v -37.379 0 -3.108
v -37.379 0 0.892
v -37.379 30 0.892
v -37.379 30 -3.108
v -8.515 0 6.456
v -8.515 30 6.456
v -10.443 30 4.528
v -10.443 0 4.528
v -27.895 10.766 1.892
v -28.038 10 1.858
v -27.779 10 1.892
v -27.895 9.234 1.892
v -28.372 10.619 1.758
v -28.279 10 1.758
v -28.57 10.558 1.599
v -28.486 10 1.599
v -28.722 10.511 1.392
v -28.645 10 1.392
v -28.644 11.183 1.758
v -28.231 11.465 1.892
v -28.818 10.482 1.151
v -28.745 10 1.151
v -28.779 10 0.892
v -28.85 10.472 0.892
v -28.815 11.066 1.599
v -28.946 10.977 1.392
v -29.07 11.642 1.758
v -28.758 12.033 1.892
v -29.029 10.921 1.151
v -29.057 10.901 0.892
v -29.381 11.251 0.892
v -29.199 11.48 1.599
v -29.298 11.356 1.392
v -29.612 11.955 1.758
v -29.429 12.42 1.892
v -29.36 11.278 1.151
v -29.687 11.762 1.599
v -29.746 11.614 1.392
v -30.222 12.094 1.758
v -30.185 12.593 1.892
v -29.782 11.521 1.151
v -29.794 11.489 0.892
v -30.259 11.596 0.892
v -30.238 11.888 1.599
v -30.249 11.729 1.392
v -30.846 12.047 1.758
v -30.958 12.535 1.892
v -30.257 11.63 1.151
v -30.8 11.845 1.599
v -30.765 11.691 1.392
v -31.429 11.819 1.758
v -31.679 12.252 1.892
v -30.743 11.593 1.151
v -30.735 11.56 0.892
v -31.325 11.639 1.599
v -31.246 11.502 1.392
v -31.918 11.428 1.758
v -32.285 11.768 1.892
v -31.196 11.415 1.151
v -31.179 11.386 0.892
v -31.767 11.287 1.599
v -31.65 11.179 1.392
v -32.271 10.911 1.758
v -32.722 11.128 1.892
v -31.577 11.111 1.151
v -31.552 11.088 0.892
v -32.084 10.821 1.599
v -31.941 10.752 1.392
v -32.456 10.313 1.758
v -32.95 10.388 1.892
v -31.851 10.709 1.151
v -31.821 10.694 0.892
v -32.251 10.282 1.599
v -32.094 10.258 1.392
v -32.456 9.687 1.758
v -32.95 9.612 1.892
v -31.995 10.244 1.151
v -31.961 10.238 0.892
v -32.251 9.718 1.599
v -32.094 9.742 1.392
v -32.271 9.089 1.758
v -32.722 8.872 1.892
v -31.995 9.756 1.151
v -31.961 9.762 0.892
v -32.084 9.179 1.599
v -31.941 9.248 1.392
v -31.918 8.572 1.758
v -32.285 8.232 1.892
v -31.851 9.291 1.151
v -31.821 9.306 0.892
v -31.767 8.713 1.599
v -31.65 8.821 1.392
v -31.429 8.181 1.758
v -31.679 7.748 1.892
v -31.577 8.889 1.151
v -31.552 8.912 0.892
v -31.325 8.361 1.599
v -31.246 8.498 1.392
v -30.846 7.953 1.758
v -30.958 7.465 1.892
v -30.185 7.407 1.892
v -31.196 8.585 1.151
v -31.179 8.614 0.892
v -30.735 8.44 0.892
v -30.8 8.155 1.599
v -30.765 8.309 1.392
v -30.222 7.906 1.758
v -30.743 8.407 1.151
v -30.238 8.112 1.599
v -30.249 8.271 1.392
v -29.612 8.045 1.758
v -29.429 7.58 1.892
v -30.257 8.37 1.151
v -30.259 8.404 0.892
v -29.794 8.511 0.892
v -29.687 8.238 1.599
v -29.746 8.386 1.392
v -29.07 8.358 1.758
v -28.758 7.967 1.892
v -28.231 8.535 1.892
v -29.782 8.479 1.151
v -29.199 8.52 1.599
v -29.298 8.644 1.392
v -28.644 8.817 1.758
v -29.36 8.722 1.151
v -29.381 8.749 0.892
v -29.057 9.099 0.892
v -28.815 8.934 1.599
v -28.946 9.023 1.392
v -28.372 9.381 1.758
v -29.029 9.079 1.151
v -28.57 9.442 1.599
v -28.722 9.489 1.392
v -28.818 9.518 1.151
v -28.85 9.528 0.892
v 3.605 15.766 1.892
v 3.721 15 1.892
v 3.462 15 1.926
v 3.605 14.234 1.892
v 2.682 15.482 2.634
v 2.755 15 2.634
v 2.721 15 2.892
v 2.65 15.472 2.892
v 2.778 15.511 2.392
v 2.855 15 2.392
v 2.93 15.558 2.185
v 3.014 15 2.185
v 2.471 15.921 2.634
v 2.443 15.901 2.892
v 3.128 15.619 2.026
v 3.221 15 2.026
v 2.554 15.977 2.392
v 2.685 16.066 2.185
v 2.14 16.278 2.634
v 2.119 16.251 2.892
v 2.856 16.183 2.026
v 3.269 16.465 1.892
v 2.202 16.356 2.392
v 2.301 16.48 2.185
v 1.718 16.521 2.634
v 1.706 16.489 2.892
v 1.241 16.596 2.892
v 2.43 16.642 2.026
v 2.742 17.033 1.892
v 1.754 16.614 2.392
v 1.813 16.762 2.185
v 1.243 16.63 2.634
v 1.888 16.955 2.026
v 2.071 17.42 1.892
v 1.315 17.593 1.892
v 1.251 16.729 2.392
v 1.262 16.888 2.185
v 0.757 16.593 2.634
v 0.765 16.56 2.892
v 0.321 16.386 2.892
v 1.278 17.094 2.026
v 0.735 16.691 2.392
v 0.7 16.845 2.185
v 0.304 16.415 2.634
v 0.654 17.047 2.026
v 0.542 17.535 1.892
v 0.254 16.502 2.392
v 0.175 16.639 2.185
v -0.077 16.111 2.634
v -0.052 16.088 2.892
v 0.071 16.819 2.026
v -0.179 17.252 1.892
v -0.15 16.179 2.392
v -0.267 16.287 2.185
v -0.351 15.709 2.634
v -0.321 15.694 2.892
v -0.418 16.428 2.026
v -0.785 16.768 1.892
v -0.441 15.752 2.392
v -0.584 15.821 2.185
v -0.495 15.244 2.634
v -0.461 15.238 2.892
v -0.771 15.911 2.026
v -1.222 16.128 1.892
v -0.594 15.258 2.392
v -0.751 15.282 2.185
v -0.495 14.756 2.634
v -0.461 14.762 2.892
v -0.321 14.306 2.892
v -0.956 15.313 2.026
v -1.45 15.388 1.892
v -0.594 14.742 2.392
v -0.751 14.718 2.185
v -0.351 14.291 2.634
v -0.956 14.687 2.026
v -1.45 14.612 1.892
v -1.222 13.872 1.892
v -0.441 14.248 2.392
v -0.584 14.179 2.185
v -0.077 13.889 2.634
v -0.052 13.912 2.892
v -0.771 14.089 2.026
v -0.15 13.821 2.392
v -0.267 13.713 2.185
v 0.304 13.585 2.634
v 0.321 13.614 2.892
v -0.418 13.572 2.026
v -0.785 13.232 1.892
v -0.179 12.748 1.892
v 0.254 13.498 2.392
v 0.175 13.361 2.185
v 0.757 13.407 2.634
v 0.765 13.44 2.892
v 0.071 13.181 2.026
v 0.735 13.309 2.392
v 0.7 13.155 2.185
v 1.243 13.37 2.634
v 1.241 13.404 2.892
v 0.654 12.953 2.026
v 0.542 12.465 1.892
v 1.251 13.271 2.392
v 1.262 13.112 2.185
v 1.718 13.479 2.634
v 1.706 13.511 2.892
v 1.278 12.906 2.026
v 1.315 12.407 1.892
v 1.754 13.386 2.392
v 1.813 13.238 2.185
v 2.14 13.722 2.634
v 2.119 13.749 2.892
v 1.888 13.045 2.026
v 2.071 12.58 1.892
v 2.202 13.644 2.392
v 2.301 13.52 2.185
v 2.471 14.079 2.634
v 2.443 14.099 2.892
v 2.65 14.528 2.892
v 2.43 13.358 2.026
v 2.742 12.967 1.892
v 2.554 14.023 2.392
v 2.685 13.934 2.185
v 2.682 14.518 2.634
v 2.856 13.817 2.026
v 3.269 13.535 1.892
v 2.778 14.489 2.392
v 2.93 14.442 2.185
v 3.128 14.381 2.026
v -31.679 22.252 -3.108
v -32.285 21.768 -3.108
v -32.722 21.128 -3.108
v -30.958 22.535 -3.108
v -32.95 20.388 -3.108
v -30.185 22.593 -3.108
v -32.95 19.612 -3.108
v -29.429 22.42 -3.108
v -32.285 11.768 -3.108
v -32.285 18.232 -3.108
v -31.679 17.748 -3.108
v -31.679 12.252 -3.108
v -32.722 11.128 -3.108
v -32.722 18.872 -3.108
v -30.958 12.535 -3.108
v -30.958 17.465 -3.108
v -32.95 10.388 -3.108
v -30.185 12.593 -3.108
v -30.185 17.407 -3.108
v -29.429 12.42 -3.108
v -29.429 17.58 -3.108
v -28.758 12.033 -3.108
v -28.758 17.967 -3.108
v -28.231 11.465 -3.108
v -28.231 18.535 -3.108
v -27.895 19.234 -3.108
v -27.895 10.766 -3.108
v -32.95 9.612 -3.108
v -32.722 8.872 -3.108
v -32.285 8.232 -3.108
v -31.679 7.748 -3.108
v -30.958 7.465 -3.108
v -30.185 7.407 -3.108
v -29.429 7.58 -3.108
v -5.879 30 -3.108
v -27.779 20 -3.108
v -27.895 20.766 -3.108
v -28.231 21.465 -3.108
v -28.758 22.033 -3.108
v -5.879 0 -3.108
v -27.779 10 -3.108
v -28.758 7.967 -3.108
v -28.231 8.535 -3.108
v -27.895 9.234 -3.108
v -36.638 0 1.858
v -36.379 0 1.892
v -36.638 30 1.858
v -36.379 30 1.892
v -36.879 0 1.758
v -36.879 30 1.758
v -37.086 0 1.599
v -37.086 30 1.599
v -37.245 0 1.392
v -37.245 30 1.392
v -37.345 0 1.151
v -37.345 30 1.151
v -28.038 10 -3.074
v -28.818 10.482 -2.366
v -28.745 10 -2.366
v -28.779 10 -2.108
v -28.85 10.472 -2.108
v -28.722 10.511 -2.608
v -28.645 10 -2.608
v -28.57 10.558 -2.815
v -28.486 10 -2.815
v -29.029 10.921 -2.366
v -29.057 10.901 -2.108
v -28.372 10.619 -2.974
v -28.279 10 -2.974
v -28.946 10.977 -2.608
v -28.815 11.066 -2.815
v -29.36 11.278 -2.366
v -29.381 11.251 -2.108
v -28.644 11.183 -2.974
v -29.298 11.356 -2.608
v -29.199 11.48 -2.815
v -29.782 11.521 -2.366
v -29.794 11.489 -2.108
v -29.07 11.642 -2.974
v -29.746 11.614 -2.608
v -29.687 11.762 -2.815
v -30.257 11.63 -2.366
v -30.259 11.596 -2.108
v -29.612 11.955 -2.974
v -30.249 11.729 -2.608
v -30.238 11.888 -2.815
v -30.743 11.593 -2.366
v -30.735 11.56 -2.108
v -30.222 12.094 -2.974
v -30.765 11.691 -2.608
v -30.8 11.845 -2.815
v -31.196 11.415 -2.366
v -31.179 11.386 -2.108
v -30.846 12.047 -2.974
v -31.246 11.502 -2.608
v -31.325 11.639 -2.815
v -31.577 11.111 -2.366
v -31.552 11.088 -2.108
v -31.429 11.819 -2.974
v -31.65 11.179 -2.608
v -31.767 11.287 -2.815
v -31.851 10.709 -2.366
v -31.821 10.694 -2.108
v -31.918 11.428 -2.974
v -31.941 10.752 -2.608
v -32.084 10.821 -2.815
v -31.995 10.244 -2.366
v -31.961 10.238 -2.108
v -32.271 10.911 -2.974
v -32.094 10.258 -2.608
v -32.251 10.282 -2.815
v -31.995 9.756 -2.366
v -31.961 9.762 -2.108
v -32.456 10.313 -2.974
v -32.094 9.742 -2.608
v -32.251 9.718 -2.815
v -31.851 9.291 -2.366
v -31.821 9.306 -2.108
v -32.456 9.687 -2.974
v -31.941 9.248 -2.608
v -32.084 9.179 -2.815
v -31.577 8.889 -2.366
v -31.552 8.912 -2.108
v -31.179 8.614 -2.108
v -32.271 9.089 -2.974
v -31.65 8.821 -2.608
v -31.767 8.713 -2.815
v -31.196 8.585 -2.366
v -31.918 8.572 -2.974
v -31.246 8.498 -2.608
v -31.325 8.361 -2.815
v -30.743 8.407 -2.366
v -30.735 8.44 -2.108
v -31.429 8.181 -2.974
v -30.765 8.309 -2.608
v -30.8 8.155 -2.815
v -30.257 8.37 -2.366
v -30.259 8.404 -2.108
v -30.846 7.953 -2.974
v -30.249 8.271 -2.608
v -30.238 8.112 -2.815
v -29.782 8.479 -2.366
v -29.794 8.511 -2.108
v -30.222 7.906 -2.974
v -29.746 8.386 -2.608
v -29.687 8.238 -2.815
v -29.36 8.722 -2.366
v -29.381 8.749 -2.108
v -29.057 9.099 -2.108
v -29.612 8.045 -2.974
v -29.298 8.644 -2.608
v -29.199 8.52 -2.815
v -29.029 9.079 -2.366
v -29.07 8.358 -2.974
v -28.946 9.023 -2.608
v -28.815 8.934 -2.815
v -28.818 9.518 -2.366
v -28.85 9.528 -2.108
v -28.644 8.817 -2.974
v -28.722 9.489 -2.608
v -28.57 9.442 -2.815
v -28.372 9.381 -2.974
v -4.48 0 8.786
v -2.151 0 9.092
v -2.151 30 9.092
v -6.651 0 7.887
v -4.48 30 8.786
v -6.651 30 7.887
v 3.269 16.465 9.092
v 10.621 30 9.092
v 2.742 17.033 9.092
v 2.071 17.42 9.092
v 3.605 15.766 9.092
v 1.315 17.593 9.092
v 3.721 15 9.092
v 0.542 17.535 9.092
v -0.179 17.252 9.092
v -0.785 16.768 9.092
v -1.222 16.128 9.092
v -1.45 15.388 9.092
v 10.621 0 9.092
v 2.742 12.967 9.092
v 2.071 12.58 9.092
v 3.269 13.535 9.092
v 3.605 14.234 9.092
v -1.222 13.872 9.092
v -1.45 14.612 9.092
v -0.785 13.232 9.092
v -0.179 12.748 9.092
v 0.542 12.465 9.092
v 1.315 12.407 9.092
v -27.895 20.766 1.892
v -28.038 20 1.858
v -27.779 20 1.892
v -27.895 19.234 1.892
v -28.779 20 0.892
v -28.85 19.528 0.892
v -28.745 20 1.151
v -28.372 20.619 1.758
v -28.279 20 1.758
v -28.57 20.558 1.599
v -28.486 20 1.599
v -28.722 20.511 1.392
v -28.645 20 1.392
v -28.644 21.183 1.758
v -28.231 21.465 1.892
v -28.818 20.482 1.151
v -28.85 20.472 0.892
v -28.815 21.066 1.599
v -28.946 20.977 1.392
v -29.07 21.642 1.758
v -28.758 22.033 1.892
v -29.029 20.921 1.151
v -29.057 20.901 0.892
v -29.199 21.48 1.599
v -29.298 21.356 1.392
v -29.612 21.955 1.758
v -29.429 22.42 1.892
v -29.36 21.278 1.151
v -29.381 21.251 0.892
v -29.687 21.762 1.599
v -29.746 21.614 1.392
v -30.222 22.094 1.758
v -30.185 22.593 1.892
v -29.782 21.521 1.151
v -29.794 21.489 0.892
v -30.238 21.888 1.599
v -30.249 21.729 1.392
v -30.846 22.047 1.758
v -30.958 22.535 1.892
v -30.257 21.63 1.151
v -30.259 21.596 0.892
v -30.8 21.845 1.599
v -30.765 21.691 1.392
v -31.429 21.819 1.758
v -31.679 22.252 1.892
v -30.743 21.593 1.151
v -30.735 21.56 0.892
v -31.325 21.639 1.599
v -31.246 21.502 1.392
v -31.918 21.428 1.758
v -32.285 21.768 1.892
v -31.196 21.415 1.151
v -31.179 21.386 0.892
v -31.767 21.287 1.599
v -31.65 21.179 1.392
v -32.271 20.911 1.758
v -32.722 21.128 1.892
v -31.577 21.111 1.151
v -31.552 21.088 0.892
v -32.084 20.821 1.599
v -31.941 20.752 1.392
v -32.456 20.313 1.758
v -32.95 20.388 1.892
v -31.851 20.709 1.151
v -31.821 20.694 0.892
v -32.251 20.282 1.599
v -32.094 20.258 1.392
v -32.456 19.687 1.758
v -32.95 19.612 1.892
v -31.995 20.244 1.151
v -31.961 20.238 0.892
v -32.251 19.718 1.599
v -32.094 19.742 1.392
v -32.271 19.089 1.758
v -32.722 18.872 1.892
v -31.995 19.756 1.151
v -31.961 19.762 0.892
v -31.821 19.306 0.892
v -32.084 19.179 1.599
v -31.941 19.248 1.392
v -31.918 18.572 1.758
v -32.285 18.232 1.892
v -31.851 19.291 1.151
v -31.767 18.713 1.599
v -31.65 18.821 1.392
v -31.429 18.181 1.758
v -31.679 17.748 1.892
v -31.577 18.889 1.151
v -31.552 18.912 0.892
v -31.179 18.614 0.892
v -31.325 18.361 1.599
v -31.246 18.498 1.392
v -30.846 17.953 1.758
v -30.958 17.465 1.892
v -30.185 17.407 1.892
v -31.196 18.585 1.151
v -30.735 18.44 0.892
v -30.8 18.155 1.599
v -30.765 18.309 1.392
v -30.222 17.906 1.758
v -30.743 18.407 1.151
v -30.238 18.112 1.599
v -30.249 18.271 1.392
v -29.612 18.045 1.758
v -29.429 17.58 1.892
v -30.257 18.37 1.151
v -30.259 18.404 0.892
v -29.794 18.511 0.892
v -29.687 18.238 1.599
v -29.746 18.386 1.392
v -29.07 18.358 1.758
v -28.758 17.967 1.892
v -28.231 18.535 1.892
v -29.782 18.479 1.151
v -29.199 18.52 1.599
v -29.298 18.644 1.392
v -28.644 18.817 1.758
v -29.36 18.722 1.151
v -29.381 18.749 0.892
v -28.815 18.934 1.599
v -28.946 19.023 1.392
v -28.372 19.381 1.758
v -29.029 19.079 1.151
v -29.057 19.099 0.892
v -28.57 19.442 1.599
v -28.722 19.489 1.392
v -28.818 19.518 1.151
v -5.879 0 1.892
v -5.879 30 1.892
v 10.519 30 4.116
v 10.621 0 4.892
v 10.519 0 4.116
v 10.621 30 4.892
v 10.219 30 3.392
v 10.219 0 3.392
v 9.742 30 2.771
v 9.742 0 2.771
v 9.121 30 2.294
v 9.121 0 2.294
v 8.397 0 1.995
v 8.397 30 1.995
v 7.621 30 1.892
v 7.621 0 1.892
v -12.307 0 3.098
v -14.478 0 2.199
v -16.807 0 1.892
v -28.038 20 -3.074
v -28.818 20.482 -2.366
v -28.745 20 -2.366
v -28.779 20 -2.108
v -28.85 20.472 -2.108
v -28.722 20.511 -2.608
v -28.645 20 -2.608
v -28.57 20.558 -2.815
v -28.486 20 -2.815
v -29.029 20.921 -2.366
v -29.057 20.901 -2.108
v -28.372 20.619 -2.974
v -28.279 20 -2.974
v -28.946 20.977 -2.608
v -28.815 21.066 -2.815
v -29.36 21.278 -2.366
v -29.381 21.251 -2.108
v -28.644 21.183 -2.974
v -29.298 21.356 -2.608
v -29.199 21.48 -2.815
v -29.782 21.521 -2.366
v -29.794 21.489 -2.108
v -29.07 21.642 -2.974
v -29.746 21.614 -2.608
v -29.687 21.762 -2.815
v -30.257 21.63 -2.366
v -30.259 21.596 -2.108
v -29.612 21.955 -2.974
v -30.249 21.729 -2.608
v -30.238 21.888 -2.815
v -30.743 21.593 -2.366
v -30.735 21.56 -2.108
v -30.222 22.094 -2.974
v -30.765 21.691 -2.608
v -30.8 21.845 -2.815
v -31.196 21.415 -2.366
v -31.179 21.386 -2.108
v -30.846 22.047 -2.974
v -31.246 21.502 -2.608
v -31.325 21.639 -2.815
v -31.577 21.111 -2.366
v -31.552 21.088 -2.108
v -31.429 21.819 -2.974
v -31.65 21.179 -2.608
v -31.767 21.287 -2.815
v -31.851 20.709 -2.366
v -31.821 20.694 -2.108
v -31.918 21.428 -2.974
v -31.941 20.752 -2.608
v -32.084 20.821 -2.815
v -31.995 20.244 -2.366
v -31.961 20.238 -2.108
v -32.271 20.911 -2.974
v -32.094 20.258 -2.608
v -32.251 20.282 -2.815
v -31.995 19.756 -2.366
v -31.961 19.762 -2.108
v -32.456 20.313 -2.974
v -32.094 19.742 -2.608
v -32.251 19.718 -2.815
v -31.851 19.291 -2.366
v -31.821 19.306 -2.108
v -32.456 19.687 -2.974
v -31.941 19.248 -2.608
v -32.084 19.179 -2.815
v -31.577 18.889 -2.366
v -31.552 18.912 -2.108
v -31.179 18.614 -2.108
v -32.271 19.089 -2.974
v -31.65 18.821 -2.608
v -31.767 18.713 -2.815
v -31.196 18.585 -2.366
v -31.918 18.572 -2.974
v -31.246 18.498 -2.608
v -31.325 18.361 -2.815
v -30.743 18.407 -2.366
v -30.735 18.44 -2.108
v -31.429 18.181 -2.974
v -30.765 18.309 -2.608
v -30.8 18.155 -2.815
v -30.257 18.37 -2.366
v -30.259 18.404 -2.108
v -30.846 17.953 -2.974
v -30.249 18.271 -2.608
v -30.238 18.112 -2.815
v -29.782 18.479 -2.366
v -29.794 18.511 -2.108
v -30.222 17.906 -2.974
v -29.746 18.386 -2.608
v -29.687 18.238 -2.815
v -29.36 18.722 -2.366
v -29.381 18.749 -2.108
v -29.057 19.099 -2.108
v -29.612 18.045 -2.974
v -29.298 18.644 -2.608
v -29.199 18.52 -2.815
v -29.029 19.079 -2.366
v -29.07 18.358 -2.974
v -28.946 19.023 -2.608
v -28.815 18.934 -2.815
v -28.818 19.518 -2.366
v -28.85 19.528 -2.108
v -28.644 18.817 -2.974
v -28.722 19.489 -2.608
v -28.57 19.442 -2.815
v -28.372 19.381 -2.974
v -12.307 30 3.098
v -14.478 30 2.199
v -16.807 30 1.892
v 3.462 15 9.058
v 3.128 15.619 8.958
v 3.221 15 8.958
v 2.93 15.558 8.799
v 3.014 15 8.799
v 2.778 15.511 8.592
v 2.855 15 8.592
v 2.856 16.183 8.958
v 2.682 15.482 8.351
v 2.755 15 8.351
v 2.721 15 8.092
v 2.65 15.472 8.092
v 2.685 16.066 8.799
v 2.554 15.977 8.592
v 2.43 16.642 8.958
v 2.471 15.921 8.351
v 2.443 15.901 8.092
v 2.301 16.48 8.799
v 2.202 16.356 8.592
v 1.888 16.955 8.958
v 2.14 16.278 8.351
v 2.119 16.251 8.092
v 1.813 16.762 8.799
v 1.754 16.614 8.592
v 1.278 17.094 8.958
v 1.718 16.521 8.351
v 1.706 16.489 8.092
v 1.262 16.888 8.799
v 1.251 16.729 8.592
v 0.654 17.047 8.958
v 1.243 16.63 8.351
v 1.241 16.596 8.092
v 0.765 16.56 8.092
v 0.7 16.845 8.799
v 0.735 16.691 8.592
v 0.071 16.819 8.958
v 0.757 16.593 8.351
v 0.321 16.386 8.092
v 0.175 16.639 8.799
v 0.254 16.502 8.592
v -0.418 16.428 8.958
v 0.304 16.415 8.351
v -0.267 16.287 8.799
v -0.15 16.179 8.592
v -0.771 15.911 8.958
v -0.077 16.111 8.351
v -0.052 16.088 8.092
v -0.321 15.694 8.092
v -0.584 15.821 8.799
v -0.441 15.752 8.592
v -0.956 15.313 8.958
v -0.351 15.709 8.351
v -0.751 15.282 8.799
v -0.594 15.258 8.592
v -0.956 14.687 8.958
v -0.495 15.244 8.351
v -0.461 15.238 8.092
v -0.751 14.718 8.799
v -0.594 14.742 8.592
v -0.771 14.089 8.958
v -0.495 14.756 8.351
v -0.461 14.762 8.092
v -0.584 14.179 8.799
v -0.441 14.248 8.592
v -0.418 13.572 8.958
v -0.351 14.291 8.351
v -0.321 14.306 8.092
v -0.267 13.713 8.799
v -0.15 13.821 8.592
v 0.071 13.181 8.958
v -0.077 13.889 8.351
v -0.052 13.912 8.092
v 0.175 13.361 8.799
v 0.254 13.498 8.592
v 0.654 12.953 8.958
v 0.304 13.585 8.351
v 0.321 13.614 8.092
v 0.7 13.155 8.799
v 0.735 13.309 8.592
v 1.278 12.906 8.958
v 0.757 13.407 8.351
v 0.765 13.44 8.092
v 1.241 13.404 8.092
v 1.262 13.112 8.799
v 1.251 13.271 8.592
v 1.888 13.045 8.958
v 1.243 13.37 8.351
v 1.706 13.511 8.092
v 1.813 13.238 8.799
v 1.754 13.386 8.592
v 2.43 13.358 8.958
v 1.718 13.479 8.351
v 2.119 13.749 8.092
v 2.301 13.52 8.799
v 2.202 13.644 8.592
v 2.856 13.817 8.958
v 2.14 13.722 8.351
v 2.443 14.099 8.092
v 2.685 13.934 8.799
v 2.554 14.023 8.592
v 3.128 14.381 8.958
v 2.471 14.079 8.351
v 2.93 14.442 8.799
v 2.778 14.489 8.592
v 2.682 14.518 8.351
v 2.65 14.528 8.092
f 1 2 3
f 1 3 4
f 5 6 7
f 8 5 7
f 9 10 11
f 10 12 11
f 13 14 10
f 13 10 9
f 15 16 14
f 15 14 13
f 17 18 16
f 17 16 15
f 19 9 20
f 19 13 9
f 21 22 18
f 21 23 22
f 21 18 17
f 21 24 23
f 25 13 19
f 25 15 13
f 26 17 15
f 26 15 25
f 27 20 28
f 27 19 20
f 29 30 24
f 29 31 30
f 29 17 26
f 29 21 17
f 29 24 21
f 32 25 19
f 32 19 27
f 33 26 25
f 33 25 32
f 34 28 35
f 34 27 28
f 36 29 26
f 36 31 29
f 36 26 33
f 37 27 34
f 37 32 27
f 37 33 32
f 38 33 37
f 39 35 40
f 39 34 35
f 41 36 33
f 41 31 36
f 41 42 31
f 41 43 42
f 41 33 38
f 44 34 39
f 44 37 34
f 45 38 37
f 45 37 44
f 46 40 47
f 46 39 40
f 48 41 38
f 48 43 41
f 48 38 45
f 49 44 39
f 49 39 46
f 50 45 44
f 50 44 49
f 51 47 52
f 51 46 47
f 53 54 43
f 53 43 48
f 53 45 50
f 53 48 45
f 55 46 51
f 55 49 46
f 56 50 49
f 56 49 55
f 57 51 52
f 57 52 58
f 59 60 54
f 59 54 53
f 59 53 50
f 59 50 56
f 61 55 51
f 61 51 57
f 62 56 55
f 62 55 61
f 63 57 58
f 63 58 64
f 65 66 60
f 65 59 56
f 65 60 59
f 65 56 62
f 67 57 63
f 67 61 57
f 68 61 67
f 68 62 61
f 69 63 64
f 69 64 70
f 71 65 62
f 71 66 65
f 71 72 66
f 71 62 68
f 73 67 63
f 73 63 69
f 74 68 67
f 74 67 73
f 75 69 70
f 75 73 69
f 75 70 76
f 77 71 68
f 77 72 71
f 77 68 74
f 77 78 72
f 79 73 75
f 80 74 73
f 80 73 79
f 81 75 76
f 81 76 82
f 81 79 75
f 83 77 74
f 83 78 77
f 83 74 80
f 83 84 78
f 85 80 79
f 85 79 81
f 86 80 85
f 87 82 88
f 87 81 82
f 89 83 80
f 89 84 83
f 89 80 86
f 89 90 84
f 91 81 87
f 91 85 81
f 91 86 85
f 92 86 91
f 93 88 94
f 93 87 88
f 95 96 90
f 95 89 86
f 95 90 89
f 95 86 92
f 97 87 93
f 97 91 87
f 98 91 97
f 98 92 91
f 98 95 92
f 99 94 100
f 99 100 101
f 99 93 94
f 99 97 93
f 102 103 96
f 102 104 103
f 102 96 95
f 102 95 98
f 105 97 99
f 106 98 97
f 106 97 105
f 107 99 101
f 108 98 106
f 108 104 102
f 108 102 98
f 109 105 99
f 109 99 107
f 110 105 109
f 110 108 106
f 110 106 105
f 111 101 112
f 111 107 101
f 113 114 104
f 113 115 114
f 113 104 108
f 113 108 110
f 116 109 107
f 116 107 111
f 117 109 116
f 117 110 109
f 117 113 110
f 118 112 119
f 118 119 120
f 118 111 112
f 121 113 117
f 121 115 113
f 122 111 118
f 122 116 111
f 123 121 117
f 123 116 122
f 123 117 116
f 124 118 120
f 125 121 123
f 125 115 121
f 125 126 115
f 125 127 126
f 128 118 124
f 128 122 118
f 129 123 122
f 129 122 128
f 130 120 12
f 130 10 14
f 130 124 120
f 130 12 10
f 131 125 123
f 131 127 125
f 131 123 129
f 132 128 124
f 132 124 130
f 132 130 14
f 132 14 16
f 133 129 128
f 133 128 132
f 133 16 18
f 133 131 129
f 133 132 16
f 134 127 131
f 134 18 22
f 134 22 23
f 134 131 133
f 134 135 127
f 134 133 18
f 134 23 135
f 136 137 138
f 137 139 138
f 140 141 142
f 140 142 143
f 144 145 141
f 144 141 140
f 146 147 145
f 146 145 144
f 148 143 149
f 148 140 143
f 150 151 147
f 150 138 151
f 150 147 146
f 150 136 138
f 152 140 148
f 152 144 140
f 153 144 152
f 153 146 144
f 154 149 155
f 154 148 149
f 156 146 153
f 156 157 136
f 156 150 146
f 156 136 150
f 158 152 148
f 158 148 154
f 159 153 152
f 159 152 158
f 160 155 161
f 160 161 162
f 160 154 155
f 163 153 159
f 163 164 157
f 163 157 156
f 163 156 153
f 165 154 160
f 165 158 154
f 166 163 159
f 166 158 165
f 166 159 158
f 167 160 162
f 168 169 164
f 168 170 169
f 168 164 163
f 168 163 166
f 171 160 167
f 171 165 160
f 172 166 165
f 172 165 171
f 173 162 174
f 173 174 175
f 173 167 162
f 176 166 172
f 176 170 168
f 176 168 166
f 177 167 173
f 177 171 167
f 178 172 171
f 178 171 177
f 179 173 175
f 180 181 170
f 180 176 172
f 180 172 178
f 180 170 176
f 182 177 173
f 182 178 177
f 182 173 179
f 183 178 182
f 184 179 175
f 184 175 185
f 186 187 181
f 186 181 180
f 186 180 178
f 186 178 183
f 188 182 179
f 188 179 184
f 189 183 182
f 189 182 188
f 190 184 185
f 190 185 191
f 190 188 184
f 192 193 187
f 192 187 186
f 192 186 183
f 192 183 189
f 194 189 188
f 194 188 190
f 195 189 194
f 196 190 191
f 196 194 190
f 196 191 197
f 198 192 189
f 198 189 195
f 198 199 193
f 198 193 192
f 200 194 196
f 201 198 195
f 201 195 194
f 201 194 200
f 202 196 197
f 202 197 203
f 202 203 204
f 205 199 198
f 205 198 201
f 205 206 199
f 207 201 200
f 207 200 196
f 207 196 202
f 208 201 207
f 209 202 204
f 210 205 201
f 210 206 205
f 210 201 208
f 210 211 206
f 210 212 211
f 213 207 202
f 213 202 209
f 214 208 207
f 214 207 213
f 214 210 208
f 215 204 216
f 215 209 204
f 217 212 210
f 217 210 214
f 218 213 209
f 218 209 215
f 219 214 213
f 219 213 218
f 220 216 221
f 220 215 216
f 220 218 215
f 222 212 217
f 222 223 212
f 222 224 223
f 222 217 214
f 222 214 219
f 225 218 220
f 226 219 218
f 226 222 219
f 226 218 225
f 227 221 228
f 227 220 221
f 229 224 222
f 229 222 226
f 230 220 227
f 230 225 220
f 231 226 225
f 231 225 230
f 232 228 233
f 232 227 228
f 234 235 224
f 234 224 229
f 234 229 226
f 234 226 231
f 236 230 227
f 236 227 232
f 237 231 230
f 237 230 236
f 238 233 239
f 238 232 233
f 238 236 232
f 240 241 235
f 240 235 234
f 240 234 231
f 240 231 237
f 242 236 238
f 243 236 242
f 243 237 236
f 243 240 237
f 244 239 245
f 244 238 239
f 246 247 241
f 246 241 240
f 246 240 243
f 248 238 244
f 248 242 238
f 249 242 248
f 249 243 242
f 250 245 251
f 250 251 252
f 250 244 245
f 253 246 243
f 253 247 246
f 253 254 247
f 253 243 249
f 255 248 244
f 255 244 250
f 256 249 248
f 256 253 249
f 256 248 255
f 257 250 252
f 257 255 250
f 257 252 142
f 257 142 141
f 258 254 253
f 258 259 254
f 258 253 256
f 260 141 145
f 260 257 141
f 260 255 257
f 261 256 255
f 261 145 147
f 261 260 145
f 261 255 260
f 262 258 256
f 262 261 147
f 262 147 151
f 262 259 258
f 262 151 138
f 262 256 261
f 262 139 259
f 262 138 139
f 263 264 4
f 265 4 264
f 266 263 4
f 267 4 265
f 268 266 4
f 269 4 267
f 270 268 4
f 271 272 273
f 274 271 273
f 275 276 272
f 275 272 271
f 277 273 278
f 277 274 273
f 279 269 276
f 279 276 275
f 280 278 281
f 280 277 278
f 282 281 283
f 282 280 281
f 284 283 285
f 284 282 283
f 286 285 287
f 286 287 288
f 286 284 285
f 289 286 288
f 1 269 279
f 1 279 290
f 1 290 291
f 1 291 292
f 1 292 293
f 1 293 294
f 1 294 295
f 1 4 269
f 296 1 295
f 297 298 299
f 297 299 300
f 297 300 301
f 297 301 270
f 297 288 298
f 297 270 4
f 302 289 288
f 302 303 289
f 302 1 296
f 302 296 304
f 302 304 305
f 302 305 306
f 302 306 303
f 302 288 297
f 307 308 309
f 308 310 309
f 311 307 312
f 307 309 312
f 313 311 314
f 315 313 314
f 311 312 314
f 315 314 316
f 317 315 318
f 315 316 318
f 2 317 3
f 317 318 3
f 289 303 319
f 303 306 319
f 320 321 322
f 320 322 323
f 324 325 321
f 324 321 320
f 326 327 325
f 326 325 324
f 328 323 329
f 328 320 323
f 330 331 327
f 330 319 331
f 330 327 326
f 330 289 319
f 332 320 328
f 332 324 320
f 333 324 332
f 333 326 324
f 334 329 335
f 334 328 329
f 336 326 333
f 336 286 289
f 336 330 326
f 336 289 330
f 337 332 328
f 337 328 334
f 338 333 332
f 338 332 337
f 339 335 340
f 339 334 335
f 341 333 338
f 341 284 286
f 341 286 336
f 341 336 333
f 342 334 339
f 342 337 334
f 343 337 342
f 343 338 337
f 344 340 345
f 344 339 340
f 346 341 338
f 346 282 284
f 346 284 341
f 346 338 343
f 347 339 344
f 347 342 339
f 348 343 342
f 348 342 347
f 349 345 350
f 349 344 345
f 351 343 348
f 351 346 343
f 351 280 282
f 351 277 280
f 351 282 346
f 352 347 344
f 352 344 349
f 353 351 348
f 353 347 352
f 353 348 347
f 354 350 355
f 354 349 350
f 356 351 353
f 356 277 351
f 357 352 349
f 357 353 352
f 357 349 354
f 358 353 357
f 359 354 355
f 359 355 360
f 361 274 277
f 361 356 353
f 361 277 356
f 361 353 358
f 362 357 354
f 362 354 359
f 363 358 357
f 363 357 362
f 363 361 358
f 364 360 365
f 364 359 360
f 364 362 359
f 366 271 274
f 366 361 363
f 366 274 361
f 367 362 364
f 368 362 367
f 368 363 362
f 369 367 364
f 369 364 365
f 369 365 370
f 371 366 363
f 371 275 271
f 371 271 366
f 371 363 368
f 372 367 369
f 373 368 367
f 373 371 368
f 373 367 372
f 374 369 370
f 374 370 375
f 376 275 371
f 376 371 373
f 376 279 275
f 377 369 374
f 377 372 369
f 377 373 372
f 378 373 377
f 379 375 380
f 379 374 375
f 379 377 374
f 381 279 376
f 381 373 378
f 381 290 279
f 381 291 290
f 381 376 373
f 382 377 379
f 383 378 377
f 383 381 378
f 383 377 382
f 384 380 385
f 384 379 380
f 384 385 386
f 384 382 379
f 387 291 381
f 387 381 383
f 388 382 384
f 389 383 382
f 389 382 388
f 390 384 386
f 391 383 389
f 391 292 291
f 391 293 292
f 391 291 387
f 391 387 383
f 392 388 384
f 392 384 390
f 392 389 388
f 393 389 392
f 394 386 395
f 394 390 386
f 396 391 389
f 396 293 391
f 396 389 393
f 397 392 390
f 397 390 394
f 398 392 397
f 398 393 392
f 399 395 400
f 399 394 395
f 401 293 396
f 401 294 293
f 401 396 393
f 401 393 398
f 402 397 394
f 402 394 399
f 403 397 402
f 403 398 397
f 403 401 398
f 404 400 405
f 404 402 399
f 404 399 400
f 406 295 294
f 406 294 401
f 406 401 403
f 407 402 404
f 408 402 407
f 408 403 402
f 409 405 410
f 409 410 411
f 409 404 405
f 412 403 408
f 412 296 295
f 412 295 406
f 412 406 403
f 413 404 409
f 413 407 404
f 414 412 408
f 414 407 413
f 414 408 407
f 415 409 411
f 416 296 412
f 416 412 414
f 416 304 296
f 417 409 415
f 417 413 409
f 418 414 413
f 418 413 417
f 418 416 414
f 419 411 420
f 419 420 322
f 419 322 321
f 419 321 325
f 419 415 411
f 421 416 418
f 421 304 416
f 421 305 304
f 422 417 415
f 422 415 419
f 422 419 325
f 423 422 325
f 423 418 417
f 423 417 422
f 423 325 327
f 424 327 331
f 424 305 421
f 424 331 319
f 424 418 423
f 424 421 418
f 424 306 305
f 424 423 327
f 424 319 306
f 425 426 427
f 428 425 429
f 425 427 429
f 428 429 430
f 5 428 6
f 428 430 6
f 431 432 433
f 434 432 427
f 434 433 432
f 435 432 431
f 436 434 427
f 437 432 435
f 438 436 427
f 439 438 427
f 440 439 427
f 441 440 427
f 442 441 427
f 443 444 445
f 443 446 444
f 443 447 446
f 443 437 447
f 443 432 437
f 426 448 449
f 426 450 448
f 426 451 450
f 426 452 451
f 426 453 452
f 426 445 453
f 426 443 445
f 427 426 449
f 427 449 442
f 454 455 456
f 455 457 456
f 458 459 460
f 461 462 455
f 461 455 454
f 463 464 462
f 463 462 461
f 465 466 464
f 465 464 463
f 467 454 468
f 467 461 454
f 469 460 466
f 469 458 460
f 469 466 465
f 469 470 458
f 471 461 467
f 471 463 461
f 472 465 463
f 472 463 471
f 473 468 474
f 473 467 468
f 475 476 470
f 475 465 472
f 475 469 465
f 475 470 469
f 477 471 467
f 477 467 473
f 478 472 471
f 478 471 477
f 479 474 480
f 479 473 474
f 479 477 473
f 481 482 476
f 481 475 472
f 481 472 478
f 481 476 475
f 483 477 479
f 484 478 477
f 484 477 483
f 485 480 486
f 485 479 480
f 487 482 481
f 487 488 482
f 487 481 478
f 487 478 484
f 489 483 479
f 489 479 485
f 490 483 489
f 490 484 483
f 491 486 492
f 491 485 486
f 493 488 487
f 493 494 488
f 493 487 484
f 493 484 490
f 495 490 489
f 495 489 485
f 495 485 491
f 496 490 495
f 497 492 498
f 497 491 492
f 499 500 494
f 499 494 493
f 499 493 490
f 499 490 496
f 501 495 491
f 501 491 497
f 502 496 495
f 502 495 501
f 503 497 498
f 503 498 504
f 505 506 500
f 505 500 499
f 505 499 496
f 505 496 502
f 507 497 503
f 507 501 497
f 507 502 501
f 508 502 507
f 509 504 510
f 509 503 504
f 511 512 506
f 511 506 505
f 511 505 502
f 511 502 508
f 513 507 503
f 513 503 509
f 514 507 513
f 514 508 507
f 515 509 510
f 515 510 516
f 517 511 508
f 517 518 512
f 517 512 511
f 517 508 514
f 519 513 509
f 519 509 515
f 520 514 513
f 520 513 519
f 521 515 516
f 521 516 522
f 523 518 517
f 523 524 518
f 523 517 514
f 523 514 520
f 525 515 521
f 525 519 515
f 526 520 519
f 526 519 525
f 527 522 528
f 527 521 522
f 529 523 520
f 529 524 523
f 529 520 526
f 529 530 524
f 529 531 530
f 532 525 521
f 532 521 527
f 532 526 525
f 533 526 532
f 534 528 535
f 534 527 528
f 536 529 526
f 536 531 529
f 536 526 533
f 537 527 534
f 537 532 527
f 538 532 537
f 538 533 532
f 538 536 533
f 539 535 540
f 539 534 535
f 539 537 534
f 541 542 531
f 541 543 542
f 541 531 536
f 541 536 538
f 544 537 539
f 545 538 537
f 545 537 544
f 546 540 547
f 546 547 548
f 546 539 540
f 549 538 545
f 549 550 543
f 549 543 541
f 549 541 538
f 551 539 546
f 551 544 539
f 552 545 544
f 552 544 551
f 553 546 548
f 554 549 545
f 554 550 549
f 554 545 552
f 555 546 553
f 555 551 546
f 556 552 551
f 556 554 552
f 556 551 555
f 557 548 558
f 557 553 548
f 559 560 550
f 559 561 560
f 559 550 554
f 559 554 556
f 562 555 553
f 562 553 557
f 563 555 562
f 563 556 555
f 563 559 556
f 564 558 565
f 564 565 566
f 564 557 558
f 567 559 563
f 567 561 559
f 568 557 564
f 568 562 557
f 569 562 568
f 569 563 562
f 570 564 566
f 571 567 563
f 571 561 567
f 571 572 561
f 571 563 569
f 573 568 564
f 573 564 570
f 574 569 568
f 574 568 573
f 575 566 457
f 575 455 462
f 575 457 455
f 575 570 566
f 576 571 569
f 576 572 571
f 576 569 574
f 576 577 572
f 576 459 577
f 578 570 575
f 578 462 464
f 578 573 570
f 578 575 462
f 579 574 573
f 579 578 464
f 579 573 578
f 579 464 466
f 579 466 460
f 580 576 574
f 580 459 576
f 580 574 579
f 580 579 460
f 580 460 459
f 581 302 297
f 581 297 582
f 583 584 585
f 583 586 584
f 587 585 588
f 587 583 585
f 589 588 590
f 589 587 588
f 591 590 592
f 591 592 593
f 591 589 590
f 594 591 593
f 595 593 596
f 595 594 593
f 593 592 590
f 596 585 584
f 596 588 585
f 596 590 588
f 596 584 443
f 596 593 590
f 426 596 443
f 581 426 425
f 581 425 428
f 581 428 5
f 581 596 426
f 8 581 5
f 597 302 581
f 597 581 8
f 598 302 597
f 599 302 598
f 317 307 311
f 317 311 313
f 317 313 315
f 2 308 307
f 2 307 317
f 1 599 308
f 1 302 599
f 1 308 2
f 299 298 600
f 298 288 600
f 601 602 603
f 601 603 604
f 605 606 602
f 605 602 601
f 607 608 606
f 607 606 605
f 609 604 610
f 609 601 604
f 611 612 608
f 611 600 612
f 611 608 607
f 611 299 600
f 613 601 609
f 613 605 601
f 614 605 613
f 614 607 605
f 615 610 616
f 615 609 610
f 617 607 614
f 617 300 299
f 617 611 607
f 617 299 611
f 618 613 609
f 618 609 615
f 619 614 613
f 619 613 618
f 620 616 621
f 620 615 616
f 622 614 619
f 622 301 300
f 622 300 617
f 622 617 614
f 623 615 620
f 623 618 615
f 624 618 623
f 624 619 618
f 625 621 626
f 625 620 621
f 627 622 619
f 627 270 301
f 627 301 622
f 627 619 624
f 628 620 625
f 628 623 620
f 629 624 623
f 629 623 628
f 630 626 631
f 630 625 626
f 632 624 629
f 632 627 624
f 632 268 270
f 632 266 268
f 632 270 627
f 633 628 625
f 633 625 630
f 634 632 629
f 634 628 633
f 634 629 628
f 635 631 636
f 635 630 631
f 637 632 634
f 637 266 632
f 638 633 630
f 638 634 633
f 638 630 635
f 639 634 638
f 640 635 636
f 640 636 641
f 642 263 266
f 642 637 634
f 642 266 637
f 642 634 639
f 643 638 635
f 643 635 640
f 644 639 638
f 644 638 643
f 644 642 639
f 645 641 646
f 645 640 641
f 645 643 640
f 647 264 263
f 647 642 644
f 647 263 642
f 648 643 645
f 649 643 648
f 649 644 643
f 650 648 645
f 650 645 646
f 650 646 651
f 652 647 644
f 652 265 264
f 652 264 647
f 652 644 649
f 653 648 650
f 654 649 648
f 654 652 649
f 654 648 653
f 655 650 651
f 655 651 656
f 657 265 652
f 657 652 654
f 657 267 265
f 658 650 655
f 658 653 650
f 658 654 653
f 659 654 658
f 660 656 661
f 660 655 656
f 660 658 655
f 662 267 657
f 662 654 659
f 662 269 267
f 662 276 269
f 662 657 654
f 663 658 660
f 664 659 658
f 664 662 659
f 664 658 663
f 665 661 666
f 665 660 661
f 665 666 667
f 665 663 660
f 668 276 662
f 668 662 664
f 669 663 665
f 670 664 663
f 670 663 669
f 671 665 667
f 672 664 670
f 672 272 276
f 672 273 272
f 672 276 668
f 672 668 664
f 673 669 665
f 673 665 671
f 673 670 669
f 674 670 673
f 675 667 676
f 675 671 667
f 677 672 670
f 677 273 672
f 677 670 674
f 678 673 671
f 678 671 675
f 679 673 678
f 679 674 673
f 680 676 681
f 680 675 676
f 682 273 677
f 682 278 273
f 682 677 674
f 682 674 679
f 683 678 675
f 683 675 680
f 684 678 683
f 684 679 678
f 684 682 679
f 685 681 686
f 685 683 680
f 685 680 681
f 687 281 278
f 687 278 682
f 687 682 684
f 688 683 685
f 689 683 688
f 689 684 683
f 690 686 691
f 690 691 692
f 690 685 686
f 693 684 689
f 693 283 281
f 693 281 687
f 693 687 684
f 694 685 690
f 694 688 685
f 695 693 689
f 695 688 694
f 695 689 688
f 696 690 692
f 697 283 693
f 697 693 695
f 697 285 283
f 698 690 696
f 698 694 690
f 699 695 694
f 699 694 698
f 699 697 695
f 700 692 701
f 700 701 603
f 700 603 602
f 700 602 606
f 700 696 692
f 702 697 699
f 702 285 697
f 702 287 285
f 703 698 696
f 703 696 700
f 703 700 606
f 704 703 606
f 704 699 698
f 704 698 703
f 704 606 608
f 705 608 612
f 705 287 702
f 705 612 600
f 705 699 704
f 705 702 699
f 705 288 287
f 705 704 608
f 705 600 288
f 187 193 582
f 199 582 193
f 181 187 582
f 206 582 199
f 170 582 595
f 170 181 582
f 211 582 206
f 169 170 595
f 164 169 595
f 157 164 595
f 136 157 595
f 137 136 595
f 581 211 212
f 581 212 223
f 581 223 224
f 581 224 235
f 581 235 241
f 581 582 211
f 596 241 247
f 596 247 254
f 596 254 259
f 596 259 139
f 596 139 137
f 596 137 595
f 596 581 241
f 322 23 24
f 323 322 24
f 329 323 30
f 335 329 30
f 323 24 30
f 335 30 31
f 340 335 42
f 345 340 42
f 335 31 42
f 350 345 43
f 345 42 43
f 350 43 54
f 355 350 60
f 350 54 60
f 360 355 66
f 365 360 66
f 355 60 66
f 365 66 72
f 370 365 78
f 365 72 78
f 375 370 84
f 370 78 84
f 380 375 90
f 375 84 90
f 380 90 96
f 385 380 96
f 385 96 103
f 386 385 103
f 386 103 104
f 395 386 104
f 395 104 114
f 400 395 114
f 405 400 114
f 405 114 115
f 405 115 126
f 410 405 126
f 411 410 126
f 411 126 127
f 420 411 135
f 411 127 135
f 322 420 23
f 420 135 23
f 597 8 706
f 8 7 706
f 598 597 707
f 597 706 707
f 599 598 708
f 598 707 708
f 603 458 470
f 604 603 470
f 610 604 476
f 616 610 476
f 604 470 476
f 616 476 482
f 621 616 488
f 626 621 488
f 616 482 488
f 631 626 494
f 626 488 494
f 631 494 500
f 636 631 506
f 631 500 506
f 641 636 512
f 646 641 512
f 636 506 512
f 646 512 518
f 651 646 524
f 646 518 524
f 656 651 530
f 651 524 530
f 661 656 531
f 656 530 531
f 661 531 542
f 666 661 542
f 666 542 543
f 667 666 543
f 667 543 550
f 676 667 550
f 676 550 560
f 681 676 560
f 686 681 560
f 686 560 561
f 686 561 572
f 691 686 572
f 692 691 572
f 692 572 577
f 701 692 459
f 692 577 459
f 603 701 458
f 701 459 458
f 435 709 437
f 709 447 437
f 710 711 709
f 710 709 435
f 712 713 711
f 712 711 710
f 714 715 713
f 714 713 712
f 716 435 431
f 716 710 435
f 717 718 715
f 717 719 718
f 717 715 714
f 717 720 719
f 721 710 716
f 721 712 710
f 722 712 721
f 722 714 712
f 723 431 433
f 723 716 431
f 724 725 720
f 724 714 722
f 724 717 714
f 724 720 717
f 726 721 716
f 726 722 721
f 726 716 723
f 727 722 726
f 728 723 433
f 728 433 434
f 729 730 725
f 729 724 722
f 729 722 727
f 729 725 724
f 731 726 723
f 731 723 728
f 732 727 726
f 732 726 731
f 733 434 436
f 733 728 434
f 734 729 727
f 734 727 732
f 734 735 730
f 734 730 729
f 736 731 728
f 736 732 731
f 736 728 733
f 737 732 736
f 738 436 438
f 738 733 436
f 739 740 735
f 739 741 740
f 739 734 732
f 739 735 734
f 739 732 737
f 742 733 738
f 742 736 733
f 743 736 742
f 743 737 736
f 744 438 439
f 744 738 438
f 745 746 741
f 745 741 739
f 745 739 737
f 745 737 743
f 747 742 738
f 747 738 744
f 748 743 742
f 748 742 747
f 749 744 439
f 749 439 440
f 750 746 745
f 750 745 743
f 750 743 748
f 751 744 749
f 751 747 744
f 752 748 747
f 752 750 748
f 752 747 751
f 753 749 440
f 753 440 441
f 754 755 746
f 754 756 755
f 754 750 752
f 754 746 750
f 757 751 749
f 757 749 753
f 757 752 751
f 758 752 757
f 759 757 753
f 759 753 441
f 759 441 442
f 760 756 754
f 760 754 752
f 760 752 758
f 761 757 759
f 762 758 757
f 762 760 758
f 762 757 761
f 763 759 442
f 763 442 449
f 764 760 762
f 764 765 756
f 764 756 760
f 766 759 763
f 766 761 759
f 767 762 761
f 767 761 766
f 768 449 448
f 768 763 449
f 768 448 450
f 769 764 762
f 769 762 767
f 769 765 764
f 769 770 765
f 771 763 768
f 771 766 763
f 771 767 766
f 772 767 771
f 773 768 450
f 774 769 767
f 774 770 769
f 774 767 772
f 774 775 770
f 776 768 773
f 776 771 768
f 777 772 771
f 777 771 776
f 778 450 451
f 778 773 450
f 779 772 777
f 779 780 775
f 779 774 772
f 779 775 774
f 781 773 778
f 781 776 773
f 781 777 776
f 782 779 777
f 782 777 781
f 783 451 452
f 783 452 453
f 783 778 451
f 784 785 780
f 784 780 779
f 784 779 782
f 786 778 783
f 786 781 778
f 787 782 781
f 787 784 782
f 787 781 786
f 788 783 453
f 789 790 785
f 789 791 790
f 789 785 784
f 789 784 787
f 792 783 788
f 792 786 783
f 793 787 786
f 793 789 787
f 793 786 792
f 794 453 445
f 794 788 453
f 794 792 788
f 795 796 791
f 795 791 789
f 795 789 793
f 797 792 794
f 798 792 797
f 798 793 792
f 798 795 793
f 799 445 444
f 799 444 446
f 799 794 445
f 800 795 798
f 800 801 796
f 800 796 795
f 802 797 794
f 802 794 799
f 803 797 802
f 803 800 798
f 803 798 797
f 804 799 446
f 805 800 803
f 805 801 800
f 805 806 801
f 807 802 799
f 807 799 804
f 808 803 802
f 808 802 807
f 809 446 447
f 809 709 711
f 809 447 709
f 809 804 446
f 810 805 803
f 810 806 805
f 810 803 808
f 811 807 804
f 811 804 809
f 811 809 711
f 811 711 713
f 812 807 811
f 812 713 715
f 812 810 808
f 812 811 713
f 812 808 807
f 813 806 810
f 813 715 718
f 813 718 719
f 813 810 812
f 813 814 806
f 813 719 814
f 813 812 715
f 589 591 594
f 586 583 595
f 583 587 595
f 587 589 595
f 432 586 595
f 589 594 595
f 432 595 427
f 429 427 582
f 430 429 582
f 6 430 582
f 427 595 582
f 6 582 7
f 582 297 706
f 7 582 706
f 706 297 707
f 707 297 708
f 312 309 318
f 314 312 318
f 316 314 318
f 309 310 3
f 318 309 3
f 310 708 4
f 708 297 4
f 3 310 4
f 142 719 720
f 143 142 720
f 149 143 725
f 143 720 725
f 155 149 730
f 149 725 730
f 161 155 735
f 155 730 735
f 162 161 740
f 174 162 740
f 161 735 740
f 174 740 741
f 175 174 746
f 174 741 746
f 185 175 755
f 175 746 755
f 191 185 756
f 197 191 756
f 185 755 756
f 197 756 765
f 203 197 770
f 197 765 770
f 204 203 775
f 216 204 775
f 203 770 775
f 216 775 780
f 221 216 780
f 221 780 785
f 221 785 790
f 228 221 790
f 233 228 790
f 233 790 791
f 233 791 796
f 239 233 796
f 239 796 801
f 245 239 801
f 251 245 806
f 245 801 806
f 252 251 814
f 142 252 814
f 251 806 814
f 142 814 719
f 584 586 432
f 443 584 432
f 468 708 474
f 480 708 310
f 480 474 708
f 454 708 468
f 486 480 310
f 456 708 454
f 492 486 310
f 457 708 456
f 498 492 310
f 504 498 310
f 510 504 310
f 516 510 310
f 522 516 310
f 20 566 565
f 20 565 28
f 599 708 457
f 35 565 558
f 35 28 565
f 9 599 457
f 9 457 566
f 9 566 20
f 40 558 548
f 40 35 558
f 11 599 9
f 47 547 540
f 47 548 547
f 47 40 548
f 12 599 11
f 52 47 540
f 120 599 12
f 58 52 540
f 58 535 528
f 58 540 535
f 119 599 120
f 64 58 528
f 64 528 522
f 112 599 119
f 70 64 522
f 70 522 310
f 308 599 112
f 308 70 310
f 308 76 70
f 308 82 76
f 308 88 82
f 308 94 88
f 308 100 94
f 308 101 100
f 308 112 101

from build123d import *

# Parameters (mm, degrees)
BOSS_EXTRUDE1_DEPTH = 30
SKETCH2_R           = 1.6
CUT_EXTRUDE1_DEPTH  = 7.2
SKETCH3_R           = 1.6
CUT_EXTRUDE2_DEPTH  = 5
FILLET1_R           = 1
FILLET2_R           = 3
FILLET3_R           = 9
FILLET4_R           = 1


with BuildPart() as part:
    # Sketch1 → Boss-Extrude1 (new body)
    with BuildSketch(Plane(origin=(0, 0, 0), x_dir=(1, 0, 0), z_dir=(0, 1, 0))):
        Polygon((-5.878996076, -9.092386916), (-13.078996076, -1.892386916), (-37.378996076, -1.892386916), (-37.378996076, 3.107613084), (-5.878996076, 3.107613084), (-5.878996076, -1.892386916), (10.621003924, -1.892386916), (10.621003924, -9.092386916), align=None)
    extrude(amount=BOSS_EXTRUDE1_DEPTH)

    # Sketch2 → Cut-Extrude1 (cut)
    with BuildSketch(Plane.XY.offset(9.092386916)):
        with Locations((1.121003924, 15)):
            Circle(SKETCH2_R)
    extrude(amount=-CUT_EXTRUDE1_DEPTH, mode=Mode.SUBTRACT)

    # Sketch3 → Cut-Extrude2 (cut)
    with BuildSketch(Plane.XY.offset(1.892386916)):
        with Locations((-30.378996076, 20)):
            Circle(SKETCH3_R)
        with Locations((-30.378996076, 10)):
            Circle(SKETCH3_R)
    extrude(amount=-CUT_EXTRUDE2_DEPTH, mode=Mode.SUBTRACT)

    # Fillet1
    fillet1_edges = [part.edges().sort_by_distance(p)[0] for p in [
        (-0.478996076, 15, 9.092386916),
        (-0.478996076, 15, 1.892386916),
        (-31.978996076, 20, 1.892386916),
        (-31.978996076, 20, -3.107613084),
        (-31.978996076, 10, 1.892386916),
        (-31.978996076, 10, -3.107613084),
    ]]
    fillet(fillet1_edges, radius=FILLET1_R)

    # Fillet2
    fillet2_edges = [part.edges().sort_by_distance(p)[0] for p in [
        (10.621003924, 15, 1.892386916),
    ]]
    fillet(fillet2_edges, radius=FILLET2_R)

    # Fillet3
    fillet3_edges = [part.edges().sort_by_distance(p)[0] for p in [
        (-5.878996076, 15, 9.092386916),
        (-13.078996076, 15, 1.892386916),
    ]]
    fillet(fillet3_edges, radius=FILLET3_R)

    # Fillet4
    fillet4_edges = [part.edges().sort_by_distance(p)[0] for p in [
        (-37.378996076, 15, 1.892386916),
    ]]
    fillet(fillet4_edges, radius=FILLET4_R)


solid = part.part
